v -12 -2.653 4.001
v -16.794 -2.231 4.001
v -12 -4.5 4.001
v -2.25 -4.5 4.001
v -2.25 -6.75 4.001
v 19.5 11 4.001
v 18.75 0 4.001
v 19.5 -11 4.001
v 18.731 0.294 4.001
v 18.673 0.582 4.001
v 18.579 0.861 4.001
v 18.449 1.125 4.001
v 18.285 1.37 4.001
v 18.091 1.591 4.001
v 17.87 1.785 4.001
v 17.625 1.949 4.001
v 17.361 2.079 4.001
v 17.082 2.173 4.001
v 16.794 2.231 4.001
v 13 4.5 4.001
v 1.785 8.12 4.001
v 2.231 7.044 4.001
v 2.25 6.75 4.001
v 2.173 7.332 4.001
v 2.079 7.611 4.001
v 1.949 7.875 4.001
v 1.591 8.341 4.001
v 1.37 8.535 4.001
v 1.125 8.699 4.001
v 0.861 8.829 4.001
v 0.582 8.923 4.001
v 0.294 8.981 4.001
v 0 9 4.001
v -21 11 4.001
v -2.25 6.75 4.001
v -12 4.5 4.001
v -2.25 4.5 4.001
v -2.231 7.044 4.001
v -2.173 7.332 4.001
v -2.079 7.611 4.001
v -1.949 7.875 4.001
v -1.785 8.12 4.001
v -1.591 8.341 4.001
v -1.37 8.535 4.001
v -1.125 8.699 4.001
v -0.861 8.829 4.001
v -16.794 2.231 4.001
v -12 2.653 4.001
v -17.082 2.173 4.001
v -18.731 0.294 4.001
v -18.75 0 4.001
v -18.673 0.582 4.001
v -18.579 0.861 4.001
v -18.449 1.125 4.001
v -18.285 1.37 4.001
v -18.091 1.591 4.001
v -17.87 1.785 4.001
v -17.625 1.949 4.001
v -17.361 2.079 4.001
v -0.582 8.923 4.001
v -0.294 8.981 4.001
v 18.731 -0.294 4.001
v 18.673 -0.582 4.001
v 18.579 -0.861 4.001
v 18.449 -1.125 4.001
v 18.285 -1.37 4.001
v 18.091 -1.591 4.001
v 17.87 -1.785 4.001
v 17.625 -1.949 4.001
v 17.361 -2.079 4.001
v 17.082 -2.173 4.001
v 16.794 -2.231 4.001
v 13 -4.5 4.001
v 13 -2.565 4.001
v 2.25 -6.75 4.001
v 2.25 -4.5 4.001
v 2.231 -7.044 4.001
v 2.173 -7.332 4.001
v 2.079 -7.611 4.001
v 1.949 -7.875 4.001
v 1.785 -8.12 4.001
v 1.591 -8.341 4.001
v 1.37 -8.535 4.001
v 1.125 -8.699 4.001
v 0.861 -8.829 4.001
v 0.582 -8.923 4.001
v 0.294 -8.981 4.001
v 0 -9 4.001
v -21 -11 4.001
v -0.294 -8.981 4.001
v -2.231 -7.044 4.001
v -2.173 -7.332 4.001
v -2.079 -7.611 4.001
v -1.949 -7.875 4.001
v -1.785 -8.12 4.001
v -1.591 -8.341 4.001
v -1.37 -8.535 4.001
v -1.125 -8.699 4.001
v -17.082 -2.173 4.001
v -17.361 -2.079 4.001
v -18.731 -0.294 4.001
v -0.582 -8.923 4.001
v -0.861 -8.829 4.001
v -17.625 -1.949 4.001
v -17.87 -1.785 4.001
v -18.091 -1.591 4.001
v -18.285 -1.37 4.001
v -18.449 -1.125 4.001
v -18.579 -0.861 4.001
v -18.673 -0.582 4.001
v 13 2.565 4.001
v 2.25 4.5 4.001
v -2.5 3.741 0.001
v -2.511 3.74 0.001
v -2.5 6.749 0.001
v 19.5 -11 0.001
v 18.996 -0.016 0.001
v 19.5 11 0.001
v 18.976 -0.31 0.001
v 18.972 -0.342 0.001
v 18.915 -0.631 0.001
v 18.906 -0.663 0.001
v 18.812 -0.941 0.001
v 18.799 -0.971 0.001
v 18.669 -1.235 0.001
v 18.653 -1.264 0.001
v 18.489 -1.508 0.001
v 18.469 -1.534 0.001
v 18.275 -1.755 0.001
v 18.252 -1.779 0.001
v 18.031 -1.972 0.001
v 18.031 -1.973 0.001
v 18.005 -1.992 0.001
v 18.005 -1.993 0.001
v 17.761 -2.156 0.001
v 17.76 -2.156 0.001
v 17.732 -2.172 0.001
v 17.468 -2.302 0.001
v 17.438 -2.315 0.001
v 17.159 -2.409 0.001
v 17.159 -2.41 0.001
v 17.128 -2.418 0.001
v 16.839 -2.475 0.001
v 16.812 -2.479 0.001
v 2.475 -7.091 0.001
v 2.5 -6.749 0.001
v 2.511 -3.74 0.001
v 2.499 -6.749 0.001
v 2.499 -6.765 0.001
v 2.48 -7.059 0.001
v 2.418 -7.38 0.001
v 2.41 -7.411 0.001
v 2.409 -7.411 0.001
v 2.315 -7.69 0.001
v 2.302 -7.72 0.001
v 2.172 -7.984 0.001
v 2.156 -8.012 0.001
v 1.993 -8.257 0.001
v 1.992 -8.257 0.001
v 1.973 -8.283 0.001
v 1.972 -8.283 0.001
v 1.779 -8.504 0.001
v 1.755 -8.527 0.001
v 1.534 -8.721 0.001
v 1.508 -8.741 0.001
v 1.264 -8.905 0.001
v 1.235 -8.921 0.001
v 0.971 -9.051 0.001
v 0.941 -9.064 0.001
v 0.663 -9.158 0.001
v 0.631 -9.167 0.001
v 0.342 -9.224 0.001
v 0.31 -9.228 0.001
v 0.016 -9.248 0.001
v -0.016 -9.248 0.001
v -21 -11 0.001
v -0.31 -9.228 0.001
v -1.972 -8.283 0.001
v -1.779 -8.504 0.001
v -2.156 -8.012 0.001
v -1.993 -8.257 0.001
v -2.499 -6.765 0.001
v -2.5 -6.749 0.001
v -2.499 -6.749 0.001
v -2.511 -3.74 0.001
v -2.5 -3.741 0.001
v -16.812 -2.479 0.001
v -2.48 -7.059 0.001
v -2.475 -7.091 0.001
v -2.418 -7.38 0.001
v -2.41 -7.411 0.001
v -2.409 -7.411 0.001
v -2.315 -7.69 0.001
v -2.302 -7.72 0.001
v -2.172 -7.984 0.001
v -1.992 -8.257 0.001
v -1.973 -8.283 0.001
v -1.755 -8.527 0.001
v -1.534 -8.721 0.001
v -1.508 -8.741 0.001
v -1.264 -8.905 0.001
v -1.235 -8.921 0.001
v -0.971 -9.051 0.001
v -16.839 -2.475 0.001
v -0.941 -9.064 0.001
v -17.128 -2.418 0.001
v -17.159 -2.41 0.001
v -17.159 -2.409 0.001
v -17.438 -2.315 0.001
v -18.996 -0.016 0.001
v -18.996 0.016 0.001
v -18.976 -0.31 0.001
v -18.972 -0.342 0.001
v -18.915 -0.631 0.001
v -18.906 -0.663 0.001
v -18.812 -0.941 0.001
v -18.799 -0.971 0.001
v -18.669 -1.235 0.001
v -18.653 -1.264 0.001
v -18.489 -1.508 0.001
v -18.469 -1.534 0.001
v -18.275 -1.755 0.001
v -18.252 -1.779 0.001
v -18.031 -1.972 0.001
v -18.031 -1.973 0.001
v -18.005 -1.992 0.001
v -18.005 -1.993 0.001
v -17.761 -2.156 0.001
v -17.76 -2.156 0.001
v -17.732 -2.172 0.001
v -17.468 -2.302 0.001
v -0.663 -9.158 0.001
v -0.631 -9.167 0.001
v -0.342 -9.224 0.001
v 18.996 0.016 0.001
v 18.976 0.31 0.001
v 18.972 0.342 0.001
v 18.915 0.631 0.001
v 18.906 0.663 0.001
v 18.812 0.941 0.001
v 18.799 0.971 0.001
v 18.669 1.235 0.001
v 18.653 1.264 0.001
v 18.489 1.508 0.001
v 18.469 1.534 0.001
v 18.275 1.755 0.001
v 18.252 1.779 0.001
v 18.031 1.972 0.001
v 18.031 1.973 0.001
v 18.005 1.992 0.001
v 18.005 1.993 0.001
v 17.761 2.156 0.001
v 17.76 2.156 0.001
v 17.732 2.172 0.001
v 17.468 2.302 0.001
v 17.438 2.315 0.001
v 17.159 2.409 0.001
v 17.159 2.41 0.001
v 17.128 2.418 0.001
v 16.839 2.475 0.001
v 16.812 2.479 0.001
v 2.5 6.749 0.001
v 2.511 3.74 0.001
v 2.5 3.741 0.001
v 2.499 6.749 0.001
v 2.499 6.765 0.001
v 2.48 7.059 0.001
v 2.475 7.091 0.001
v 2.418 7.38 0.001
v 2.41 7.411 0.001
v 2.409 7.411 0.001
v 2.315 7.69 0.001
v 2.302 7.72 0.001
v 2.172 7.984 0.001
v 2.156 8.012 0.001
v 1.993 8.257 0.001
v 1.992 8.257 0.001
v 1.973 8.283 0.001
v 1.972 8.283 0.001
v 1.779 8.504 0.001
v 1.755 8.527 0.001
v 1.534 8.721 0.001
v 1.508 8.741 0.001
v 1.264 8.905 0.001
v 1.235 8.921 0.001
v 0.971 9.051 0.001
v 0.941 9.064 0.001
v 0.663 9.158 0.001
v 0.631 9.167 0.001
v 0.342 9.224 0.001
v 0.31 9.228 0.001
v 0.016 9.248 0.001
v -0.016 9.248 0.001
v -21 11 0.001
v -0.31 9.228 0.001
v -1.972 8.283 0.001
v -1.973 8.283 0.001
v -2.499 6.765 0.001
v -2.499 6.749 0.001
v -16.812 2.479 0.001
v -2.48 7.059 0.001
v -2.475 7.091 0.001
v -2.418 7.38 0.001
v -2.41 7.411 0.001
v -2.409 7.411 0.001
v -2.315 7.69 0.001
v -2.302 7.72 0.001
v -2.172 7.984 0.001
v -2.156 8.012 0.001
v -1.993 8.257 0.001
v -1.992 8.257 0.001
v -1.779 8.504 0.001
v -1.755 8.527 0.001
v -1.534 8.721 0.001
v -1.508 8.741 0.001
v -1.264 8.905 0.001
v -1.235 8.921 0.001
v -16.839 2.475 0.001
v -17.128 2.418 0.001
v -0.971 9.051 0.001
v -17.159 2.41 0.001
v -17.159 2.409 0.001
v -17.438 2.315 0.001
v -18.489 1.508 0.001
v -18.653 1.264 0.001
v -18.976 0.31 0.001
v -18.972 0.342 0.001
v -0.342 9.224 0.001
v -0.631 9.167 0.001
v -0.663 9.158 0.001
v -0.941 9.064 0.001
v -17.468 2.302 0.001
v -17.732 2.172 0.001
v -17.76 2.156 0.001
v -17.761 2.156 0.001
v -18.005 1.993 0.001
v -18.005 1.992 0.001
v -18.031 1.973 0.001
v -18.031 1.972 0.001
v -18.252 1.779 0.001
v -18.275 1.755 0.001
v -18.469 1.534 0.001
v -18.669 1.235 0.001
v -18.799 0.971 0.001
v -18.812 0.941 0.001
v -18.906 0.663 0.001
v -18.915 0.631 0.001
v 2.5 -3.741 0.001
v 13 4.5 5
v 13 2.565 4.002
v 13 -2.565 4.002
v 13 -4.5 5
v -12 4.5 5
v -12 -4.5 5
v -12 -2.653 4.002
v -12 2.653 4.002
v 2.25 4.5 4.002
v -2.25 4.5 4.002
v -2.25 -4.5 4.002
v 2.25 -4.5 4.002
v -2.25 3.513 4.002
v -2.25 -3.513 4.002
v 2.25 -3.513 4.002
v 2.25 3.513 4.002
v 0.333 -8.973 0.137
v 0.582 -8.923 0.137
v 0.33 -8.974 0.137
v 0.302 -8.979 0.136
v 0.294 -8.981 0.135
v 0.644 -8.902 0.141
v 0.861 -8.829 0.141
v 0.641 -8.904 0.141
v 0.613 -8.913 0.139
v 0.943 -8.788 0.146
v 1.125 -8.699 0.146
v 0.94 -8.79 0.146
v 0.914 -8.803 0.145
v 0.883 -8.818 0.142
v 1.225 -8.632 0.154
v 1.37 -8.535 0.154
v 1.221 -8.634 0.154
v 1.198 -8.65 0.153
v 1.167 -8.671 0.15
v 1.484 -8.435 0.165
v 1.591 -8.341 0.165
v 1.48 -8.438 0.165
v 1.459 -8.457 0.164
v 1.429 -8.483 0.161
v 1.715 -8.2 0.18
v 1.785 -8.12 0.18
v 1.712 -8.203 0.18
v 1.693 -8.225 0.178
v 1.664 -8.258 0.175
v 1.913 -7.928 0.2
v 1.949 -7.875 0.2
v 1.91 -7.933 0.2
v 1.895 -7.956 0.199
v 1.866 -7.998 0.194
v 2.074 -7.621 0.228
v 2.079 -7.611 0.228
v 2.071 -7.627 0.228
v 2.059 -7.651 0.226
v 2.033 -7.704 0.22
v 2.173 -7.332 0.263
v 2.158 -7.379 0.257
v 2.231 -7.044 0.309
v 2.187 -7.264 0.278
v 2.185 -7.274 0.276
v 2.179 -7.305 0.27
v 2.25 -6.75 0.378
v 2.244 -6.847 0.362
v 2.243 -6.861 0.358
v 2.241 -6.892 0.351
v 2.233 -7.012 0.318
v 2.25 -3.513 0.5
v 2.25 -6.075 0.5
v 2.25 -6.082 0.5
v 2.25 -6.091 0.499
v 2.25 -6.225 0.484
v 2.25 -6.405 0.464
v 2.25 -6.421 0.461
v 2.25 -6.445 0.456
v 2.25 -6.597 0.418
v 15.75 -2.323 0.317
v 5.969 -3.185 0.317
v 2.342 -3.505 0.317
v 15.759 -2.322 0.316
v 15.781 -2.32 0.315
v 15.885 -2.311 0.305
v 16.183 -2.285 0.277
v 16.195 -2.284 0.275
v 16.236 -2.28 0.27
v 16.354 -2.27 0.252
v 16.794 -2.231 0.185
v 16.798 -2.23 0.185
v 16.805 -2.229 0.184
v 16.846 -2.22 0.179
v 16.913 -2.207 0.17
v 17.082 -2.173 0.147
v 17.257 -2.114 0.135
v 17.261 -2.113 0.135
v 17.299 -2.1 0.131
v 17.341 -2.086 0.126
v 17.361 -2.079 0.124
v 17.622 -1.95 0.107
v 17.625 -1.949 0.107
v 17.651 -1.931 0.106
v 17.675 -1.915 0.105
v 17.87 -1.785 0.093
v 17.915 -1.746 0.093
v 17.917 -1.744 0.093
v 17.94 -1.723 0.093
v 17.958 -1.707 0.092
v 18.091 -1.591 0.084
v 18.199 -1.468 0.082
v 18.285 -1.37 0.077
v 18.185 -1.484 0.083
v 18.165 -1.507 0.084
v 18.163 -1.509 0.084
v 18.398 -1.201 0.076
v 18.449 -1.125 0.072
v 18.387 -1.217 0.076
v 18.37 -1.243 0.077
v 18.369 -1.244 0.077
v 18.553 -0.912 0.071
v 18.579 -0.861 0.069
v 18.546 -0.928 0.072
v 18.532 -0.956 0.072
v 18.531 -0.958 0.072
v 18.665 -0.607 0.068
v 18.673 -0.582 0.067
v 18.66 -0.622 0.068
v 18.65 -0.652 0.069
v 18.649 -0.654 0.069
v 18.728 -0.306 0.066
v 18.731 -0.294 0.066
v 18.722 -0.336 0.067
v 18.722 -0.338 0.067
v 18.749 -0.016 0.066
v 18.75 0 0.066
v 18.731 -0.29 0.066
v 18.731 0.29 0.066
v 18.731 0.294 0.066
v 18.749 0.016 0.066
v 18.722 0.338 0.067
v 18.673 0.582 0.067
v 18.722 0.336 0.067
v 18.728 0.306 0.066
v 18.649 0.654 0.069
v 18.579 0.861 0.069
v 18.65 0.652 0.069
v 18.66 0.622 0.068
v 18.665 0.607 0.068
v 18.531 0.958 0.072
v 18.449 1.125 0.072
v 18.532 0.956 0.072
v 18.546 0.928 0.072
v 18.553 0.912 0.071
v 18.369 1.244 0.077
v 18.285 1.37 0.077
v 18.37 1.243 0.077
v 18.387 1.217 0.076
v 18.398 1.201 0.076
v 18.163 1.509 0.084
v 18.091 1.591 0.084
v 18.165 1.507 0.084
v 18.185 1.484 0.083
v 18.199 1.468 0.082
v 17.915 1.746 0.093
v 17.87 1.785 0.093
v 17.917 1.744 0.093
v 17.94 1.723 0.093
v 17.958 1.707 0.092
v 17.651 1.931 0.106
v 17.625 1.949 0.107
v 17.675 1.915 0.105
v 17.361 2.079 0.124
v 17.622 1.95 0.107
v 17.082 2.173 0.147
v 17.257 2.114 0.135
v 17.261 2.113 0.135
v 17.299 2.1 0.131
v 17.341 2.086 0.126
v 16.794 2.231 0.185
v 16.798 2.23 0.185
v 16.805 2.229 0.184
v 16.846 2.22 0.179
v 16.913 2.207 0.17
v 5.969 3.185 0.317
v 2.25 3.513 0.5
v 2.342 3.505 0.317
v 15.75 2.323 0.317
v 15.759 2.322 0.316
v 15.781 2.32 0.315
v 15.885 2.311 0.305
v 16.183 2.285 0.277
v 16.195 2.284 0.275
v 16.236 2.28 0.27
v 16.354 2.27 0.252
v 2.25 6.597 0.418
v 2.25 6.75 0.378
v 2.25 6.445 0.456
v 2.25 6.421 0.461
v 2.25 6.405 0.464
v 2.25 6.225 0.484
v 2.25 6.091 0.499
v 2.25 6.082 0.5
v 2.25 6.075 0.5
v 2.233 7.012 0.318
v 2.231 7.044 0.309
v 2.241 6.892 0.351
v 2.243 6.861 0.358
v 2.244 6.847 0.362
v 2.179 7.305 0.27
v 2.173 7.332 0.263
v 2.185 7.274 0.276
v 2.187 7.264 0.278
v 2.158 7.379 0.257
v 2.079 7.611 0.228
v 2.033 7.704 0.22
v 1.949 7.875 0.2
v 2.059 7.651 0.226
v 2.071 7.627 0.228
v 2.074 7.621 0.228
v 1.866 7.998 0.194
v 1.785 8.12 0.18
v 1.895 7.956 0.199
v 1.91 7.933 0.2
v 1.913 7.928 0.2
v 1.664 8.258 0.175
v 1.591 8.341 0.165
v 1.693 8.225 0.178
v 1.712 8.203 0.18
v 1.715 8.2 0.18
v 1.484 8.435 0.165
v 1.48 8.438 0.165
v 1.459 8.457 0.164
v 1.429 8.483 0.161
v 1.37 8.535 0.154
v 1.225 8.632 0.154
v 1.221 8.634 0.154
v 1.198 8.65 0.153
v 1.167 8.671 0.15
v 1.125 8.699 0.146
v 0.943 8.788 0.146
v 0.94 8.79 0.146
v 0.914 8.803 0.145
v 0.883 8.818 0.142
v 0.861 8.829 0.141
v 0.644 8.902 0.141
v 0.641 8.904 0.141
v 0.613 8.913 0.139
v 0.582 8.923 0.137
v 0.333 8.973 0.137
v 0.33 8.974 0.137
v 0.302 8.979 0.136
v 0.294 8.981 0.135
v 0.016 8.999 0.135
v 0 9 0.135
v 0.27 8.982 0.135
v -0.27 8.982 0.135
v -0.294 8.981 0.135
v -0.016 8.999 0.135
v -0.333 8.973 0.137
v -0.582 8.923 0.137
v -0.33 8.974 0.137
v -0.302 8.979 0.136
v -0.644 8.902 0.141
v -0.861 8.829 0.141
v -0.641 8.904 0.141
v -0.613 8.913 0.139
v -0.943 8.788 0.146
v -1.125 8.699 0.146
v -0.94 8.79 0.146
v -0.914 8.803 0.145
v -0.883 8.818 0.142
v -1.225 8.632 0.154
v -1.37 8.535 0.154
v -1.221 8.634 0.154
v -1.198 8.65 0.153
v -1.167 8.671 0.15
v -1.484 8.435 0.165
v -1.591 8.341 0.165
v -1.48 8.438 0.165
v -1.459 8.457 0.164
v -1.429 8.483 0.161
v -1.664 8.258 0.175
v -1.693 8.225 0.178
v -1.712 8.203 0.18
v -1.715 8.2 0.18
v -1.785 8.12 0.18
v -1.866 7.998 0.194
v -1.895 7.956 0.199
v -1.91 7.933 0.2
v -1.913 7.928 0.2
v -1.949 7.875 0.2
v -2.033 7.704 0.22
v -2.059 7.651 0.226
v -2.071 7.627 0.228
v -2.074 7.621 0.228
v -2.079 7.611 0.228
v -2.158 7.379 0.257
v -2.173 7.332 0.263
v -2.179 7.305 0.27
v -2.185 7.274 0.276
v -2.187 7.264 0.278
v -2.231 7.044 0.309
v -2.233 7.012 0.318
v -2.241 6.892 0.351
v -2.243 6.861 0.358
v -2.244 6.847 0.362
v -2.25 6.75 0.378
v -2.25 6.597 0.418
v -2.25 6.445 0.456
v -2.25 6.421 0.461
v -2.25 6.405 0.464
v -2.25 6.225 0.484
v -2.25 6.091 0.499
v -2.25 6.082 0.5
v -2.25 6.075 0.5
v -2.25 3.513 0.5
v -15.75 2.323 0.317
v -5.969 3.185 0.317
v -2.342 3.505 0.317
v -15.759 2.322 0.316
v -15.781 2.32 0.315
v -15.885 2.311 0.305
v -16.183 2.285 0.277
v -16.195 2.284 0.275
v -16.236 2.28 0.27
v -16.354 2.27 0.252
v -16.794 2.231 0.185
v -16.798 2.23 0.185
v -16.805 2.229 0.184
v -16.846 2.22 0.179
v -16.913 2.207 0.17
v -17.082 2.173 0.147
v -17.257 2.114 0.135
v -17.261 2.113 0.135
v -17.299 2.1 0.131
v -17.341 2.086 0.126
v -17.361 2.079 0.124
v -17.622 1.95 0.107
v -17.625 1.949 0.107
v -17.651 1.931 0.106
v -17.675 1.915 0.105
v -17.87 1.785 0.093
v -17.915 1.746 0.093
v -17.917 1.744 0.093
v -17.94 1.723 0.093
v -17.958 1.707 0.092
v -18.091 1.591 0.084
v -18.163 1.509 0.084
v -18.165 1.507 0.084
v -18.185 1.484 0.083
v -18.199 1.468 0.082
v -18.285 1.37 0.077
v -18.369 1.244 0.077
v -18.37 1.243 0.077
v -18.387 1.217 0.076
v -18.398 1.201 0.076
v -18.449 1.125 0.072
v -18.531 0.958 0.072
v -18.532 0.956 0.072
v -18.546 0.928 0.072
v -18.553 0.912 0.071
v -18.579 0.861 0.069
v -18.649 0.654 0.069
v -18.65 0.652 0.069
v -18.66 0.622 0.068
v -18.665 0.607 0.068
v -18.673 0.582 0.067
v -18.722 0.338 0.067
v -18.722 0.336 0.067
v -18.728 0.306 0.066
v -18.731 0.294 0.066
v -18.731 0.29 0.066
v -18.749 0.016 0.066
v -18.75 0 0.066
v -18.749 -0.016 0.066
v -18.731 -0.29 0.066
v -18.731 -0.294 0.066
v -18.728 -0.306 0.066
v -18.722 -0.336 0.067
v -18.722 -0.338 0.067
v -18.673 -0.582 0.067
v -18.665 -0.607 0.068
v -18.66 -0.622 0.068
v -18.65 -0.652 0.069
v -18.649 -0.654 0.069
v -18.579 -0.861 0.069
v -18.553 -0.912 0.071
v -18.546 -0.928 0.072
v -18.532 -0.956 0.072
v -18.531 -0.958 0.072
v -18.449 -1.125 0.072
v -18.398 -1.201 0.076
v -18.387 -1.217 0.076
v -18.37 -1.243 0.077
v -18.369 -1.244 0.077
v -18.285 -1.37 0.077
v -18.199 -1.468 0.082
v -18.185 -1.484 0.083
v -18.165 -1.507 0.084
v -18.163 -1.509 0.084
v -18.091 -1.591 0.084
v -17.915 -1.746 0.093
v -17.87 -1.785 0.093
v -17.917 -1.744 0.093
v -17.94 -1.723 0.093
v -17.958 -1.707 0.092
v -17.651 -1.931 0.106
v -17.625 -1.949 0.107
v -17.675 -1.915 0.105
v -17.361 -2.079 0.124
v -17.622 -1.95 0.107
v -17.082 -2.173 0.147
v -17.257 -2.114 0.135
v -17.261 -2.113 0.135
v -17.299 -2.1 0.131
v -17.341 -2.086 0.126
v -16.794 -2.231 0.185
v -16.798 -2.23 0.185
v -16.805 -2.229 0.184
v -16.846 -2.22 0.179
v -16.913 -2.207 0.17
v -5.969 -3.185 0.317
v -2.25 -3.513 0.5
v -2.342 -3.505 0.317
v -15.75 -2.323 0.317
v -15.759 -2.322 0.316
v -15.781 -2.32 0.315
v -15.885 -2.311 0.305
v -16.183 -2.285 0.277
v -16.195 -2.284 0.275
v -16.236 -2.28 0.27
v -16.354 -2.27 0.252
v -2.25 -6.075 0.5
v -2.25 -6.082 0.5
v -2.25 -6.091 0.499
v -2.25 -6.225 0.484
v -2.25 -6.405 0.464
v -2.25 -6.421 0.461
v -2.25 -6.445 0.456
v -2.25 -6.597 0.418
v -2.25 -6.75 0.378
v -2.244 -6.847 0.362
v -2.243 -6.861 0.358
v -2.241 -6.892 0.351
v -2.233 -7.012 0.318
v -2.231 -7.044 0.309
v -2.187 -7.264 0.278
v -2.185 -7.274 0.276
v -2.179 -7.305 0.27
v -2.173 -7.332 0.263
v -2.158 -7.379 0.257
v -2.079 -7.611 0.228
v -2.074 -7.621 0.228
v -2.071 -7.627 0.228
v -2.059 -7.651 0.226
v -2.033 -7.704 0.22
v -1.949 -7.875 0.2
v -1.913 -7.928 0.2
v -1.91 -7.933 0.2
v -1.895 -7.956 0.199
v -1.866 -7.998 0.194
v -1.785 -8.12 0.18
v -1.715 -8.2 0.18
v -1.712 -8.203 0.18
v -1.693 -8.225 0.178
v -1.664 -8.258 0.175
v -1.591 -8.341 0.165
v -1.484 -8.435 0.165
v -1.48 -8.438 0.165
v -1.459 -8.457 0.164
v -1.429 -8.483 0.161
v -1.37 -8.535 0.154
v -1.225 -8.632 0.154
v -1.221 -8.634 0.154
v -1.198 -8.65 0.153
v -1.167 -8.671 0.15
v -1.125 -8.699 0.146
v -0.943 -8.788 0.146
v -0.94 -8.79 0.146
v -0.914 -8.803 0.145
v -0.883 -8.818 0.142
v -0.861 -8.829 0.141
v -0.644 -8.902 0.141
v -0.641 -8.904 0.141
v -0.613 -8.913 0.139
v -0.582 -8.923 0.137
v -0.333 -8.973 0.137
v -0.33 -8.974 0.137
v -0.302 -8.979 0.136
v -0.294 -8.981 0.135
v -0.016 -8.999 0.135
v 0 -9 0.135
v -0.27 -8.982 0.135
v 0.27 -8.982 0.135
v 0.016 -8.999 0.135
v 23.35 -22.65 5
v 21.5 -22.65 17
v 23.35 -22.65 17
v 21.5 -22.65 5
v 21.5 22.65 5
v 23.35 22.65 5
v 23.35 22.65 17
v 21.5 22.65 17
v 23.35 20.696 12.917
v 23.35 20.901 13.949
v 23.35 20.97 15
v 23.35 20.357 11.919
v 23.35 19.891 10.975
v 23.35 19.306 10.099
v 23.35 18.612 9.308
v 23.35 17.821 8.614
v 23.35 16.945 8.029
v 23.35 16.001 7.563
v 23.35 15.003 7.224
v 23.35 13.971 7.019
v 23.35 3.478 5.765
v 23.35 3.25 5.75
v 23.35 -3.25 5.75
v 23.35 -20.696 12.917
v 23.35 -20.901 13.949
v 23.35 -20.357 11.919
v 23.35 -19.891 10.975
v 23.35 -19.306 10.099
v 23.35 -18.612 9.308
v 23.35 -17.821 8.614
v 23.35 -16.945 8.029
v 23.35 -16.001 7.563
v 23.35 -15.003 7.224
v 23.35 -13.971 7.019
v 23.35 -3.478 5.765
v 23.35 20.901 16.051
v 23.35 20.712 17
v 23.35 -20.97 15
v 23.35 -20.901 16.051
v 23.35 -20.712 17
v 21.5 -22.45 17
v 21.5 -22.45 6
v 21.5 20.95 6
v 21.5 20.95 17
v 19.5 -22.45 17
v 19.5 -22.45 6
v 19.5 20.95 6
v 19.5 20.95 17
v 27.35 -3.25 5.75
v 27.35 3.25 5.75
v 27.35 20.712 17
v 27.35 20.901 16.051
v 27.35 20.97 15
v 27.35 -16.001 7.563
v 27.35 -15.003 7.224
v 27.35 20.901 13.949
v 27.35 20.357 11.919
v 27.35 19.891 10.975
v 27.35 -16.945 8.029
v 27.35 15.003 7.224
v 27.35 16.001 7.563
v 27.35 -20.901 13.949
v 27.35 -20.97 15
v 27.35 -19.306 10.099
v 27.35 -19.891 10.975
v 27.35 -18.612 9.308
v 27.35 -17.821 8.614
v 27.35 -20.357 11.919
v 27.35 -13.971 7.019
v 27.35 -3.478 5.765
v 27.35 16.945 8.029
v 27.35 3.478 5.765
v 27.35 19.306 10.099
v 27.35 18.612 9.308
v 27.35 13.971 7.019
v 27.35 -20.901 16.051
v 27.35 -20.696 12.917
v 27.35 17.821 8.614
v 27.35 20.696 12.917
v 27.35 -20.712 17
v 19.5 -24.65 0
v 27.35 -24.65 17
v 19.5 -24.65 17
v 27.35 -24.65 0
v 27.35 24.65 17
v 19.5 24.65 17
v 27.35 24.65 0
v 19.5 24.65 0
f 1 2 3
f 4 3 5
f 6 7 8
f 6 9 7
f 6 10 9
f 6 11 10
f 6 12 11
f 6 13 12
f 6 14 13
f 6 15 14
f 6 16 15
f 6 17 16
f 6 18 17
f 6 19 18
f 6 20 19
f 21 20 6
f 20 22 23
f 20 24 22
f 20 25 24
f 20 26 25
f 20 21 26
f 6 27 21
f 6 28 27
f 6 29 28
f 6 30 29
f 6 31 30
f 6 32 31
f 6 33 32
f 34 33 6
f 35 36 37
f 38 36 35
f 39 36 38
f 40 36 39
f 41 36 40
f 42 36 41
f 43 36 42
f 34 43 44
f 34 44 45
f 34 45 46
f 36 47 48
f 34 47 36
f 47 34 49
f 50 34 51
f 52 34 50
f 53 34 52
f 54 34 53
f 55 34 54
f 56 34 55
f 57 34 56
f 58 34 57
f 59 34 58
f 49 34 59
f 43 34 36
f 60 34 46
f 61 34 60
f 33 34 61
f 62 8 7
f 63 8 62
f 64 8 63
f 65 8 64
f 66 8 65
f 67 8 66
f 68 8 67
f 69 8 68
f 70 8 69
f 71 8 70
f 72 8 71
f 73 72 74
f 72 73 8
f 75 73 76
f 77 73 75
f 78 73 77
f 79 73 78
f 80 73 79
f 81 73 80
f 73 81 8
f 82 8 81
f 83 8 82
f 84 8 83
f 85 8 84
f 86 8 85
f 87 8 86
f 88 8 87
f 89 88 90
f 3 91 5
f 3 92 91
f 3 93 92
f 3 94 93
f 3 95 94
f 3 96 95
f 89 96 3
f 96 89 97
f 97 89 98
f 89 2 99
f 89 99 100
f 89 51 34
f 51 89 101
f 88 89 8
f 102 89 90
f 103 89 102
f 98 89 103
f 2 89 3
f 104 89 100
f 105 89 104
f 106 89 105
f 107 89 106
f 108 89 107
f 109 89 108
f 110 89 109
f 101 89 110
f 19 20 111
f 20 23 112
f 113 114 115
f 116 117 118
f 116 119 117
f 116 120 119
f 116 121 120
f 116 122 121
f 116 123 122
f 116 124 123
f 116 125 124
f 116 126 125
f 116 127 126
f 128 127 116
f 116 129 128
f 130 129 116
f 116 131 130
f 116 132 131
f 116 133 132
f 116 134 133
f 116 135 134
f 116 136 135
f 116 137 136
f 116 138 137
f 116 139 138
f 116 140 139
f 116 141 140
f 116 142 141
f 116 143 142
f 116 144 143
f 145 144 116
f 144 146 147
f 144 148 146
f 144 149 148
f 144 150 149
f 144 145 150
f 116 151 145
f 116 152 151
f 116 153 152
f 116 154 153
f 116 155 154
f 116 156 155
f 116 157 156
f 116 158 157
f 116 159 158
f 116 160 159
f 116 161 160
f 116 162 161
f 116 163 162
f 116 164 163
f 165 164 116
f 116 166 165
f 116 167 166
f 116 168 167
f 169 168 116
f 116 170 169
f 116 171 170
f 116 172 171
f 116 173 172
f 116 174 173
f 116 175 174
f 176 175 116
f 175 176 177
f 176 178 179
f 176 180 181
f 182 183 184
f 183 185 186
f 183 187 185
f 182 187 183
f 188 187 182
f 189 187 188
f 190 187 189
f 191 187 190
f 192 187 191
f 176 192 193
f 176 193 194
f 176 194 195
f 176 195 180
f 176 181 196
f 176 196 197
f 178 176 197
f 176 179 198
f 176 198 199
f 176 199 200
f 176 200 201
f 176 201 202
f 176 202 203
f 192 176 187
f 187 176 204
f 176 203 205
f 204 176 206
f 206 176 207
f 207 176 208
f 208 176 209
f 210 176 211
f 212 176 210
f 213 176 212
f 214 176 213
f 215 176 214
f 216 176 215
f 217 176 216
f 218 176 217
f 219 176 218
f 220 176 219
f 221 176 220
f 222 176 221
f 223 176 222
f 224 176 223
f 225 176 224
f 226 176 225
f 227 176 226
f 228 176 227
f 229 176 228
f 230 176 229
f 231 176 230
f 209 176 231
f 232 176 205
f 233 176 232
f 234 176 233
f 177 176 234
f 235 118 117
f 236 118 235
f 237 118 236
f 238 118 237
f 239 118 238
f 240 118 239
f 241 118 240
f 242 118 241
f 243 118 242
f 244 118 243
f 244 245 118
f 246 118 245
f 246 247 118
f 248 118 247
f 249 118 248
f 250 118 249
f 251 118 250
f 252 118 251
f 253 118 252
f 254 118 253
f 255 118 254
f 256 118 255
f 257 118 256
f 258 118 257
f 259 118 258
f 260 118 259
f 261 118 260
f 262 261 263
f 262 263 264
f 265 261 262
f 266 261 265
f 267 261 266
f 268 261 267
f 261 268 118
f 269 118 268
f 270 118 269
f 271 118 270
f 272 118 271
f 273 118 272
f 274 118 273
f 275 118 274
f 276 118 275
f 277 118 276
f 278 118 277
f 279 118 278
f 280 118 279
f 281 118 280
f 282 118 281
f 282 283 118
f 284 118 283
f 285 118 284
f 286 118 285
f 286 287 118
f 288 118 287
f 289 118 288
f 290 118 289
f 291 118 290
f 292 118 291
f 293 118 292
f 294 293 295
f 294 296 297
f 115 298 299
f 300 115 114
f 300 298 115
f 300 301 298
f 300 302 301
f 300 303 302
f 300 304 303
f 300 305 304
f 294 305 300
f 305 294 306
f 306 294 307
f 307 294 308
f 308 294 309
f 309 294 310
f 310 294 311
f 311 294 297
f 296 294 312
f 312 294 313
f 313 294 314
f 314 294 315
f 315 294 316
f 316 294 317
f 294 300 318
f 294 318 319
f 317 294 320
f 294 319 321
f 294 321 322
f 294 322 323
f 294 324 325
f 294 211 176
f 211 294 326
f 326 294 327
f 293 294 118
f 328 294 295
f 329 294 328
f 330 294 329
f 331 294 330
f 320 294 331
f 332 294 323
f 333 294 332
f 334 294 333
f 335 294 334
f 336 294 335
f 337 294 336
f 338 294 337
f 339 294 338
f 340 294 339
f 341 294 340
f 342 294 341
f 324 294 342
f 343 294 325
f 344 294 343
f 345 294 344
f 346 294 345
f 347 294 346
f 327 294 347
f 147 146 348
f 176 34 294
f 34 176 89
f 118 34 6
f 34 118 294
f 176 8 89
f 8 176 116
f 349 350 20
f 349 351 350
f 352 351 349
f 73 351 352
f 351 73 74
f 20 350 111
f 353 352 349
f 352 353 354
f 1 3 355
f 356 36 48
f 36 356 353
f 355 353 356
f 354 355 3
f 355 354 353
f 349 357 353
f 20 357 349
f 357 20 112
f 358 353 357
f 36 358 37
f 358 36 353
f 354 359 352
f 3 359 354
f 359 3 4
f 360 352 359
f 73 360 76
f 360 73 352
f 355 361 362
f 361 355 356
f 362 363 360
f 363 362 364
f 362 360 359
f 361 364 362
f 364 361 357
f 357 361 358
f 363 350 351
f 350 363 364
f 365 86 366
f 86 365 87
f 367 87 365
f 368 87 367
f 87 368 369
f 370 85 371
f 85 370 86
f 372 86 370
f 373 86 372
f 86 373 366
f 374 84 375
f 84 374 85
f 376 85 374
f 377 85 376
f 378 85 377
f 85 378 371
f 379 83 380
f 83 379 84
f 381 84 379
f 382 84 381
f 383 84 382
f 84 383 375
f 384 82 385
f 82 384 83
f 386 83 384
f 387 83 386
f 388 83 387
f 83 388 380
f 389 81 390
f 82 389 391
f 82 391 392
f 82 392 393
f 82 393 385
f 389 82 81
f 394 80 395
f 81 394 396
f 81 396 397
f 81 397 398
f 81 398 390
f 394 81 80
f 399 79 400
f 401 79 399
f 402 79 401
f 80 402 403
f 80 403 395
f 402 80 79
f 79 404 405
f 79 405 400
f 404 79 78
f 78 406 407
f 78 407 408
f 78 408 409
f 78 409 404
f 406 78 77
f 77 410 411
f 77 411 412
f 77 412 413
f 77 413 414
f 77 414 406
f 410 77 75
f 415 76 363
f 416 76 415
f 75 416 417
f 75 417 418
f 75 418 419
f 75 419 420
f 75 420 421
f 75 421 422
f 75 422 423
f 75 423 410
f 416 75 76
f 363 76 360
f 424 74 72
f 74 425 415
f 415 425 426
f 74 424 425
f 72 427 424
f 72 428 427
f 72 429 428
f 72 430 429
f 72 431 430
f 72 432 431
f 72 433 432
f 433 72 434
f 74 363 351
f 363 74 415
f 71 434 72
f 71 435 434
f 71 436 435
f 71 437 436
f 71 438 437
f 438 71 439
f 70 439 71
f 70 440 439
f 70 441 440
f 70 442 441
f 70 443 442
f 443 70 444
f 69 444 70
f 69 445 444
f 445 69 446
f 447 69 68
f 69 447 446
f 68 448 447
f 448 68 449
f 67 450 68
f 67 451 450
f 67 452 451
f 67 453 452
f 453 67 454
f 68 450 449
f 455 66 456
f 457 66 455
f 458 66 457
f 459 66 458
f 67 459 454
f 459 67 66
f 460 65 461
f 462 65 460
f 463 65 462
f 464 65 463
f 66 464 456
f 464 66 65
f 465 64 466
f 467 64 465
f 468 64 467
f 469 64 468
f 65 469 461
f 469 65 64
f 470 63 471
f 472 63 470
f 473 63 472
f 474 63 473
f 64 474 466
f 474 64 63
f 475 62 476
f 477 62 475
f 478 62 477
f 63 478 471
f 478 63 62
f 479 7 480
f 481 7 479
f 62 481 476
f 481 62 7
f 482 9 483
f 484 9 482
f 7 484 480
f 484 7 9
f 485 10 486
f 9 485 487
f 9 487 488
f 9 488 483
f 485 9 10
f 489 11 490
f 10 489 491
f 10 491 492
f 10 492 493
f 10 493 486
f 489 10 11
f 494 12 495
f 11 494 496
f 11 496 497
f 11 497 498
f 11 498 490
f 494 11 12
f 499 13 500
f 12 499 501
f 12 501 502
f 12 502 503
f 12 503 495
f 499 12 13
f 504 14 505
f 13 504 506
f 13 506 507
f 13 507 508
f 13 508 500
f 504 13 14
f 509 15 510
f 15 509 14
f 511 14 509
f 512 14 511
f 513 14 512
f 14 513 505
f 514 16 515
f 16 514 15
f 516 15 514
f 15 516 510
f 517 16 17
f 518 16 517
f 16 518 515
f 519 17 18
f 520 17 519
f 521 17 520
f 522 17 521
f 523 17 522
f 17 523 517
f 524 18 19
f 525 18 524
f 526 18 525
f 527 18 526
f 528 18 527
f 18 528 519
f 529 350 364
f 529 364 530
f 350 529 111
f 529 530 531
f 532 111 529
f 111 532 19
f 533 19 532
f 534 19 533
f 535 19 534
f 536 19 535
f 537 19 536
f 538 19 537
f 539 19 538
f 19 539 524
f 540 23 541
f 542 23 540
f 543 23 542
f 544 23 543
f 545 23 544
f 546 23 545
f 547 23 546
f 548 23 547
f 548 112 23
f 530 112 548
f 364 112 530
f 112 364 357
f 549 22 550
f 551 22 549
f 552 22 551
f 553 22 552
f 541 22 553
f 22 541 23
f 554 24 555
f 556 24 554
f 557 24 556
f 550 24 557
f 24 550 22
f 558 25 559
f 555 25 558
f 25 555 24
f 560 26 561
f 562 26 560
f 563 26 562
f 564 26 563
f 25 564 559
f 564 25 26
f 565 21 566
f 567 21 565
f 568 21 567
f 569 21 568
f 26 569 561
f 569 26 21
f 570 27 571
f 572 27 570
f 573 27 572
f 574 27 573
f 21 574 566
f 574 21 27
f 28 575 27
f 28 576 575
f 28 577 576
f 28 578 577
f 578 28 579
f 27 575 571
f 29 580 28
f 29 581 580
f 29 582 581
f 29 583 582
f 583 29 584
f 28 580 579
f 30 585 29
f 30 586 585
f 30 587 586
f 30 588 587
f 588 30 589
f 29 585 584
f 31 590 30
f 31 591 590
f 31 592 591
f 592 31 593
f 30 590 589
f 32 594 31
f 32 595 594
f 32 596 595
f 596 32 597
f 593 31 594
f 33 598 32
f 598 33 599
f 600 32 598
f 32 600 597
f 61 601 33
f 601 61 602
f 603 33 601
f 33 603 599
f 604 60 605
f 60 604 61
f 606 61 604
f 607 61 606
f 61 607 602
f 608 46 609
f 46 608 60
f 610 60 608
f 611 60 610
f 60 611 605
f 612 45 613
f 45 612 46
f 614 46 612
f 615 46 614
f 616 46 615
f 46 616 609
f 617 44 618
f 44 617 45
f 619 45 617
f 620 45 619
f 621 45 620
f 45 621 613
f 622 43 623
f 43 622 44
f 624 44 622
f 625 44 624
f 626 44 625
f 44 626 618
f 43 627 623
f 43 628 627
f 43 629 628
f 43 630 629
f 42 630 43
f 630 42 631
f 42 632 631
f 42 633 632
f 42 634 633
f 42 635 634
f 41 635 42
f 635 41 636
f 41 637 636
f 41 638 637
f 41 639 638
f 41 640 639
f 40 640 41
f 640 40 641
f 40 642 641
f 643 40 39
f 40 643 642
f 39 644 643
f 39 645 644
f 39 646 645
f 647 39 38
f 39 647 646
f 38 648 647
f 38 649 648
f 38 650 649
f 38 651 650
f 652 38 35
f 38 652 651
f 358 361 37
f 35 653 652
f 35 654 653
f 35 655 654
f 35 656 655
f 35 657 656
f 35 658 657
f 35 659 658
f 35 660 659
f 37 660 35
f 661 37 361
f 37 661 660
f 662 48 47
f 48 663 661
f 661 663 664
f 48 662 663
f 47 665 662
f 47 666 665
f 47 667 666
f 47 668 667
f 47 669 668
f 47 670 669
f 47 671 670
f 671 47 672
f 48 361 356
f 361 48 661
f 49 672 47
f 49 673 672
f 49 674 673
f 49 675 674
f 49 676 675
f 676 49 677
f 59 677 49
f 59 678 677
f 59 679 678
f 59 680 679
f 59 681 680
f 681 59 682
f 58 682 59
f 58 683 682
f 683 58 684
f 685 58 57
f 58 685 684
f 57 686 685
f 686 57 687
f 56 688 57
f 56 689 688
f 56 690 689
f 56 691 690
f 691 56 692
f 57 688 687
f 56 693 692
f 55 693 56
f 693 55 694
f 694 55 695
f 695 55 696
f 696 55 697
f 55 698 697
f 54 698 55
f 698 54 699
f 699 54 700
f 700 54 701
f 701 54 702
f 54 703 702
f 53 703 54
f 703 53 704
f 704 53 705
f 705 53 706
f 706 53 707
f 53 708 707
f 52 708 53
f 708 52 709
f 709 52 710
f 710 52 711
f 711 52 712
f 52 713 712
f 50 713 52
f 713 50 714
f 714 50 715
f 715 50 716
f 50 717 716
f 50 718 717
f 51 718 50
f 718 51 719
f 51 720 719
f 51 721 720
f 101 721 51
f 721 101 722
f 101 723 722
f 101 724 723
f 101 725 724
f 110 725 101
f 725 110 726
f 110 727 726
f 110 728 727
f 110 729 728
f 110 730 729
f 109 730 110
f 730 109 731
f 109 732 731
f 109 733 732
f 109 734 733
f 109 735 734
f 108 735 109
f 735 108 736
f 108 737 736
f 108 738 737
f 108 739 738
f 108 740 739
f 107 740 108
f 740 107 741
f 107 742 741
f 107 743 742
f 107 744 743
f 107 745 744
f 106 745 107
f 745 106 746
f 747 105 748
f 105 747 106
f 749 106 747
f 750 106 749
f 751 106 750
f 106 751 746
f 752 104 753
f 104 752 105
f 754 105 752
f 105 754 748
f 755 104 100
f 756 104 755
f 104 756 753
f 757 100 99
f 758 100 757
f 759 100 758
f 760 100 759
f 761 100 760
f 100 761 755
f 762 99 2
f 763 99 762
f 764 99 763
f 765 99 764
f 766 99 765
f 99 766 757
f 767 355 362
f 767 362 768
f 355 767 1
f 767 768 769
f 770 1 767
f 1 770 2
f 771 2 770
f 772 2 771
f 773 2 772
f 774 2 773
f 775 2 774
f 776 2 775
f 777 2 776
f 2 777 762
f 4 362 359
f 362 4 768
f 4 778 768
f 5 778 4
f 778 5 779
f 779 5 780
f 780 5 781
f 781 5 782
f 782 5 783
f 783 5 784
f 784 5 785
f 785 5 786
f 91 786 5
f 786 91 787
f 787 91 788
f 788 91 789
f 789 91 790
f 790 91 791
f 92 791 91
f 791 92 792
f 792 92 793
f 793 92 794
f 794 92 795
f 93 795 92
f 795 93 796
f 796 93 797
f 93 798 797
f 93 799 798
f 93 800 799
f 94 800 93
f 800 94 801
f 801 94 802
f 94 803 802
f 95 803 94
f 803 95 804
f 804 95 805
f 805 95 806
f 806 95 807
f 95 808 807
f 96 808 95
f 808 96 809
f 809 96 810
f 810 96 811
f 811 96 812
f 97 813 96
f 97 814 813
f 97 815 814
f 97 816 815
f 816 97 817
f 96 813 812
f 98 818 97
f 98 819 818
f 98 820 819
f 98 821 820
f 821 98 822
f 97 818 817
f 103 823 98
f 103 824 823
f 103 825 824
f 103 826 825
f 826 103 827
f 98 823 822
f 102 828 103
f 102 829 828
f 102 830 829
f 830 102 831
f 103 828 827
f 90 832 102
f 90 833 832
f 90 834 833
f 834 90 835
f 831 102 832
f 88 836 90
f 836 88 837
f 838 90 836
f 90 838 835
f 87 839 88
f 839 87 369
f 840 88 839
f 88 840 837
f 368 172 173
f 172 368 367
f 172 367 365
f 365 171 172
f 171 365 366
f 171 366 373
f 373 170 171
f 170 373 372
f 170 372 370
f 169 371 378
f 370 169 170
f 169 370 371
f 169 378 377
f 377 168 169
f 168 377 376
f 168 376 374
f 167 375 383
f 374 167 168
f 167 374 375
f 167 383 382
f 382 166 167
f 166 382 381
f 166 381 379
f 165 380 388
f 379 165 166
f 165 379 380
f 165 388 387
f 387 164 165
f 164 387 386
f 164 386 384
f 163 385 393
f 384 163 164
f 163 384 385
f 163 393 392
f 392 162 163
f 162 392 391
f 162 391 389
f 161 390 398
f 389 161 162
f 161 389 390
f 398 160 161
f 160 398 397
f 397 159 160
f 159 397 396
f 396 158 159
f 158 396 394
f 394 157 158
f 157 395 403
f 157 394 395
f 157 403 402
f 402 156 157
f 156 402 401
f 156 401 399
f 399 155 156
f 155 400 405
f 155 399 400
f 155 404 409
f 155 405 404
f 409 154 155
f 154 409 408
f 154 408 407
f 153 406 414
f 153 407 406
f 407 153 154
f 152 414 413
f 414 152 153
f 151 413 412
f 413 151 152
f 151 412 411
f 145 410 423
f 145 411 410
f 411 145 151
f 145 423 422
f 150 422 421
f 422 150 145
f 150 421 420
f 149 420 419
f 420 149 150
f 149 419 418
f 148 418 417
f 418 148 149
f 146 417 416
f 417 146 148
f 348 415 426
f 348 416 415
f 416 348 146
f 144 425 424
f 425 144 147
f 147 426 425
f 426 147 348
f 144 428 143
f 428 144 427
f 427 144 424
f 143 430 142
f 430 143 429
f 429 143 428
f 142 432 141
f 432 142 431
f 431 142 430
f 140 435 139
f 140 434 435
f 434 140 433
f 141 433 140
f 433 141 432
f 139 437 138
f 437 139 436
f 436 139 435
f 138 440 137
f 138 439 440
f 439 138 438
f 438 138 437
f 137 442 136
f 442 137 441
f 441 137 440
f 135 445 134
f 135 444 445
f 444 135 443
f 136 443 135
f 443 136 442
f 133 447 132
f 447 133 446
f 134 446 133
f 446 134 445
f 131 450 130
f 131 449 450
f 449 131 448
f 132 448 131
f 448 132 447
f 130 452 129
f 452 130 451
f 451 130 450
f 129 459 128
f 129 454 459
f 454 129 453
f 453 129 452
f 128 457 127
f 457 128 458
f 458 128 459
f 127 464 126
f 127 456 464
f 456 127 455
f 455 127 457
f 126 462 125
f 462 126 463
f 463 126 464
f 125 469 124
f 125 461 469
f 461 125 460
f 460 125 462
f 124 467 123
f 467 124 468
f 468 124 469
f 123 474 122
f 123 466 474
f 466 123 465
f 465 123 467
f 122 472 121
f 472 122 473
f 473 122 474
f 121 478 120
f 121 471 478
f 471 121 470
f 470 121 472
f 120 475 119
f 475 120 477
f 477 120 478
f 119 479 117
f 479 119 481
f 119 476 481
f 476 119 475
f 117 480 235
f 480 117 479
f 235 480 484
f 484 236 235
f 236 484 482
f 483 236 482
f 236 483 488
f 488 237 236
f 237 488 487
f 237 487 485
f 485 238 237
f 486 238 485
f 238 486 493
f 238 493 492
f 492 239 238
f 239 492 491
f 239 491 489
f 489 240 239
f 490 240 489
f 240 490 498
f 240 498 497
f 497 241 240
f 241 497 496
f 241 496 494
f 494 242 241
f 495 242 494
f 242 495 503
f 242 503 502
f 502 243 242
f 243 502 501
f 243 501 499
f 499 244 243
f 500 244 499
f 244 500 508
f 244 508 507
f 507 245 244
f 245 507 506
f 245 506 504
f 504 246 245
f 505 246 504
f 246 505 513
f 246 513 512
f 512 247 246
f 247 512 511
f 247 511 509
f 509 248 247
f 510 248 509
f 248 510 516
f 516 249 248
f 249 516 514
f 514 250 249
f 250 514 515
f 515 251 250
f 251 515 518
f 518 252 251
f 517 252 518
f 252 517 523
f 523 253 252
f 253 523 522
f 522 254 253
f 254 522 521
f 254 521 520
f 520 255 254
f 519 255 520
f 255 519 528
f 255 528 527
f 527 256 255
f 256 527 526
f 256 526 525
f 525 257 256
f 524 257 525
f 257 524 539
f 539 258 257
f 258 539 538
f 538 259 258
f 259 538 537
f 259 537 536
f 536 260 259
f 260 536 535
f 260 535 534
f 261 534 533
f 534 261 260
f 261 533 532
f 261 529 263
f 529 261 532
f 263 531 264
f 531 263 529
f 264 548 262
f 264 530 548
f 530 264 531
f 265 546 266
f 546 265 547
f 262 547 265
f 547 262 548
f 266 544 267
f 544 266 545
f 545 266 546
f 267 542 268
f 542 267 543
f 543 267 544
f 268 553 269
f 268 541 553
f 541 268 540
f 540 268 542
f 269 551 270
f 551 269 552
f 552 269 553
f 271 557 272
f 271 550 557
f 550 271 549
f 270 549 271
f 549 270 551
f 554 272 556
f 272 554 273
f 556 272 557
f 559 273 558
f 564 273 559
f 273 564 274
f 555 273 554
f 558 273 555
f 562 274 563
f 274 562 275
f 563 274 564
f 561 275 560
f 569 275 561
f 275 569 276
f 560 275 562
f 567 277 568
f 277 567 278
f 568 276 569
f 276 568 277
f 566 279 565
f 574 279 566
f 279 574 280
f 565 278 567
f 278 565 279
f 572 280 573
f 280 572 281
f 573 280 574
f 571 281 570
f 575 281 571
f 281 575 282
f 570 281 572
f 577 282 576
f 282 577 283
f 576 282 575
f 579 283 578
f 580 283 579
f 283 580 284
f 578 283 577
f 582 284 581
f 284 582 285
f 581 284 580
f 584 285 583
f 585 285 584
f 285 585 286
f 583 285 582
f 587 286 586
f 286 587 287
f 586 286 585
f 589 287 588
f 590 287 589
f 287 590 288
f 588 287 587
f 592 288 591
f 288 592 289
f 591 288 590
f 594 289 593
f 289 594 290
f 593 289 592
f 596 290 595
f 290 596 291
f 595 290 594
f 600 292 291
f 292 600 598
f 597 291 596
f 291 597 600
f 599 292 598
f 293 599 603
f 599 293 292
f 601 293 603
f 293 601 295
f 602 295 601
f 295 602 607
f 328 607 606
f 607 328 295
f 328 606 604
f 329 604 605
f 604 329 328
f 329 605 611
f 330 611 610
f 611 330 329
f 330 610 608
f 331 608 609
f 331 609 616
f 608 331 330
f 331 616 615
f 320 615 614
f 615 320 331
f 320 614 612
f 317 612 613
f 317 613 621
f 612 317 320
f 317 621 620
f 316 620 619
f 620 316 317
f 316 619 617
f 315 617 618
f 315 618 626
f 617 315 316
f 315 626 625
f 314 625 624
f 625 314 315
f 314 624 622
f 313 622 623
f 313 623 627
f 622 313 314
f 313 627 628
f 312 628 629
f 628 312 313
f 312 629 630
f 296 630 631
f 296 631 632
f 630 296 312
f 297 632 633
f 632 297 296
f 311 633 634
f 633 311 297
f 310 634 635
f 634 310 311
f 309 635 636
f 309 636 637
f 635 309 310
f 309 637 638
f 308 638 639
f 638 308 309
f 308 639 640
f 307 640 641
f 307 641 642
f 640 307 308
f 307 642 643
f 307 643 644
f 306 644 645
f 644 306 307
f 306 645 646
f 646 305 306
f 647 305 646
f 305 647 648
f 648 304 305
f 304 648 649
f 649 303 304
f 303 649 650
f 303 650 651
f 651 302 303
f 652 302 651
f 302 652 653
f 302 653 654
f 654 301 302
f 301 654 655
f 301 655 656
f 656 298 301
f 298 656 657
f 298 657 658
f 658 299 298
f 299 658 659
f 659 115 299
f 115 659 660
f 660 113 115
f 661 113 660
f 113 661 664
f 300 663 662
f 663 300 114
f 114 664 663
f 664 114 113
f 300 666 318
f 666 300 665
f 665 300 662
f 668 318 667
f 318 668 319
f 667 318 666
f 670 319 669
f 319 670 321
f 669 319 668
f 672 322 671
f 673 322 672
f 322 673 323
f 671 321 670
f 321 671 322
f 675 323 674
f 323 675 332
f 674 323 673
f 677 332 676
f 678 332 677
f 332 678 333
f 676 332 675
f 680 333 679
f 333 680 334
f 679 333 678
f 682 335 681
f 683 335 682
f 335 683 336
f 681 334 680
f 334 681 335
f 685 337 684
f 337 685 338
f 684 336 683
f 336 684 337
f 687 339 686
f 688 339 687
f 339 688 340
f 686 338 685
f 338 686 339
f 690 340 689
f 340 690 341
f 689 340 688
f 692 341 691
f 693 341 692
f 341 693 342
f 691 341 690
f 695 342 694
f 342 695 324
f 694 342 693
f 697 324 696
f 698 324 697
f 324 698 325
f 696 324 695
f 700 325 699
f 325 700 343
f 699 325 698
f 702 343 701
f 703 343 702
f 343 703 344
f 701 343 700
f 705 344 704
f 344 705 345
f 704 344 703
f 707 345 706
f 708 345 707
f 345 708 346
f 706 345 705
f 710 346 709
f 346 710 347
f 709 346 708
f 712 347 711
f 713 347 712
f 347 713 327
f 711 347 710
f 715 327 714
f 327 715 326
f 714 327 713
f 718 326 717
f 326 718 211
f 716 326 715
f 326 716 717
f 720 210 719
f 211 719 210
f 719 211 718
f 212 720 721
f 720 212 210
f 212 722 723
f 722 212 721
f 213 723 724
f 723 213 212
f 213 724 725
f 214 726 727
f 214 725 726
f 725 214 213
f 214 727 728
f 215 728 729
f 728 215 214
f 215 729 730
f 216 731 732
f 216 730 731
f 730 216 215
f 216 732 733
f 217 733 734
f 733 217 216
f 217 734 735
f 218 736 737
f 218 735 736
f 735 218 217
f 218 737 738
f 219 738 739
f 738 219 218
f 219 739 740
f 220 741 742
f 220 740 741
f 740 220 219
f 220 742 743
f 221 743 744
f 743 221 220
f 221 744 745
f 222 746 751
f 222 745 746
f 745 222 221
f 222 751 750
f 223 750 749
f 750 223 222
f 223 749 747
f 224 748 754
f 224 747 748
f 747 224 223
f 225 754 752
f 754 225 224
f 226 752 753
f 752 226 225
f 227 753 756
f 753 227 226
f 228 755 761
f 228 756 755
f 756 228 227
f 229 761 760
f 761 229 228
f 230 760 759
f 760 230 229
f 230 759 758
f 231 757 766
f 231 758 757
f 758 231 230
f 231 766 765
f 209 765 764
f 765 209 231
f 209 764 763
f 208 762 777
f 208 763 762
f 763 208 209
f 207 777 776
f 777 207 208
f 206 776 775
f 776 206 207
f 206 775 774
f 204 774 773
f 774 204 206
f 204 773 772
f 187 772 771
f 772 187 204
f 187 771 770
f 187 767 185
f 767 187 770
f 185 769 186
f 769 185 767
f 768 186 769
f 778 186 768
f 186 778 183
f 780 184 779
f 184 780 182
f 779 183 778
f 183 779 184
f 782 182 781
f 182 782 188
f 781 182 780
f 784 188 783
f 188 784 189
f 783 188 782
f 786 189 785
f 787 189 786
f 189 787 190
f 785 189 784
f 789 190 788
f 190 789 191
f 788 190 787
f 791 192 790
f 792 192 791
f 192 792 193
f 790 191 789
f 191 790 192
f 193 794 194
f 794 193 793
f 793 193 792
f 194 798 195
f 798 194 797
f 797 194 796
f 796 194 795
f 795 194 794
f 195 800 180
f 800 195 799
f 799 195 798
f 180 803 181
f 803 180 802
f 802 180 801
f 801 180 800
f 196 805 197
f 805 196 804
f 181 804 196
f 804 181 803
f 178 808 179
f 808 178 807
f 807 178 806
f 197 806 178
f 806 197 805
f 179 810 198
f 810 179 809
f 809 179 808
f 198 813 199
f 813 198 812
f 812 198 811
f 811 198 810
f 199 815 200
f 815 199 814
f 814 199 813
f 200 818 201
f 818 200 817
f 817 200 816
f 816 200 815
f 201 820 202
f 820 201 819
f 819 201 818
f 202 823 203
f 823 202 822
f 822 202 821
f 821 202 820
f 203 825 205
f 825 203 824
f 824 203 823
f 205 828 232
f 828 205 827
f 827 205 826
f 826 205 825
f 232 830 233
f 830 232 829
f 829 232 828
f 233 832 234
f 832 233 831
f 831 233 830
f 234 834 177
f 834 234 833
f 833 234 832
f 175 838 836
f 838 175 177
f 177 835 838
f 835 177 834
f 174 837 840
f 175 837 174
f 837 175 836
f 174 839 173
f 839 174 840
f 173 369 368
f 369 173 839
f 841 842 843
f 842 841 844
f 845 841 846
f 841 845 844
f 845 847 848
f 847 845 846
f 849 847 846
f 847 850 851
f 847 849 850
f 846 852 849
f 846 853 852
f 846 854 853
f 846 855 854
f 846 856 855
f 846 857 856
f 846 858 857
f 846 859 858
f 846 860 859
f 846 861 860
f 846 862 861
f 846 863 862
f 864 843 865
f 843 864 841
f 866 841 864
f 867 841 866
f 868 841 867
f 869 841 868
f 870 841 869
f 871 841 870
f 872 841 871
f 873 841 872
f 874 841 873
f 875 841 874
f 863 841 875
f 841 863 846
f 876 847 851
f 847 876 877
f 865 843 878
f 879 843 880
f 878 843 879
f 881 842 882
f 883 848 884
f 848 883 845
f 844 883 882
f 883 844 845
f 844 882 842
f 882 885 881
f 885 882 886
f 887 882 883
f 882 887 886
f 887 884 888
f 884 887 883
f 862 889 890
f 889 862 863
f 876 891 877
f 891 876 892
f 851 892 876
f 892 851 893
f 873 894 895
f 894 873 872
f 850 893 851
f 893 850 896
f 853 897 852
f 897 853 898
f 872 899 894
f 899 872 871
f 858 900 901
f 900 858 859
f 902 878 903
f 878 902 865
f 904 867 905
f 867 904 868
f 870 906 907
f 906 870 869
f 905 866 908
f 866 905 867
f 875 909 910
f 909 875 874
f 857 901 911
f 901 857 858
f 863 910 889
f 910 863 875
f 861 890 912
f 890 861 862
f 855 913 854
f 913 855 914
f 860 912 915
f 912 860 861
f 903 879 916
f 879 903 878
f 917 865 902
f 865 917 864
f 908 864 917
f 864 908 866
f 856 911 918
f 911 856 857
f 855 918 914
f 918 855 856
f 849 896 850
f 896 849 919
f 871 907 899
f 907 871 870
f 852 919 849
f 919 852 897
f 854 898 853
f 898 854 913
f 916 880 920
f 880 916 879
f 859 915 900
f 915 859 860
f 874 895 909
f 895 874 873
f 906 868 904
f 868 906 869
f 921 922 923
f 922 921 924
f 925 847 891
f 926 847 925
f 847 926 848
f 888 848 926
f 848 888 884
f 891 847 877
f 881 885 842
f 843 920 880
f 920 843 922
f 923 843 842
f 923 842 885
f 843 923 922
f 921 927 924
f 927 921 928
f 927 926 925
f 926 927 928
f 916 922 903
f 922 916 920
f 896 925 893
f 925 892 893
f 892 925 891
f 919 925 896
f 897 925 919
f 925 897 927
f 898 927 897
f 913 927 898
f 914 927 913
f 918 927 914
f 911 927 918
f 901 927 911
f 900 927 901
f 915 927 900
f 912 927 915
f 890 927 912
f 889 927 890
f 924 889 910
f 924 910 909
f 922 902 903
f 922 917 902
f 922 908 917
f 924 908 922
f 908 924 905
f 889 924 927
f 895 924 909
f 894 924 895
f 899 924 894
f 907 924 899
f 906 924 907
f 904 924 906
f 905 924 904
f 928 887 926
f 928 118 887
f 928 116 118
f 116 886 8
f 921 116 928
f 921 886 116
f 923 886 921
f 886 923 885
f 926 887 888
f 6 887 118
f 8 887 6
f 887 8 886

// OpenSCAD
$fn=48;

slop = .2;
board = [45.1 + slop, 1.65 + slop, 20];
electronics = [43.2 + slop, 5, 14];
electronics_offset = [1.7, -electronics.y, 1];
sensor_diameter = 15.9 + slop;
sensor_distance = 9.94 - slop;
bump_diameter   = 3.5;
bump_distance   = 10-bump_diameter*2;
bump_offset     = 7.5;

horn_d1 = 7.4;
horn_d2 = 4.5;
horn_d3 = 4.5;

horn_l1 = 33;
horn_l2 = 13.5;

box = [42,22,4];
difference() {
  union() {
    translate([-box.x/2,-box.y/2,0.001])
    cube(box);
    translate([-12,-4.5,4])
    cube([25,9,1]);
  }
  horns();
}

sensor_bracket();

module sensor_bracket() {
  translate([horn_l1/2+5,board.x/2+2,4])
  rotate([0,0,-90])
  difference() {
    translate([0,-2,-4])
    cube([board.x + 4, board.y + 6, board.z / 2 + 7]);
    translate([2,0,1])
    sensor();
  }
}

module horns() {
  linear_extrude(4.002)
  horn_outline();

  linear_extrude(1, scale=.8)
  offset(.25)
  horn_outline();
 
  module horn_outline() {
    hull() {
      circle(horn_d1/2);
      for (m = [0:1])
      mirror([m,0,0])
      translate([horn_l1/2,0,0])
      circle(horn_d2/2);
    }
    hull () {
      for (m = [0:1])
      mirror([0,m,0])
      translate([0,horn_l2/2, 0])
      circle(horn_d3/2);
    }
  }
}


module sensor() {
  cube(board);
  
  // electronic bits
  translate([0,.01,0])
  translate(electronics_offset)
  cube(electronics);
  
  translate([sensor_diameter/2+(board.x-sensor_diameter*2-sensor_distance)/2,board.y-.001,board.z/2])
  rotate([-90,0,0])
  linear_extrude(12)
  hull() {
    for (t = [0,1])
    translate([(sensor_distance+sensor_diameter)*t,0,0])
    circle(sensor_diameter/2);

    translate([(sensor_diameter+sensor_distance-bump_diameter-bump_distance)/2,0,0])
    for (t = [0,1])
    translate([(bump_distance+bump_diameter)*t,bump_offset,0])
    circle(bump_diameter/2);
  }
}
